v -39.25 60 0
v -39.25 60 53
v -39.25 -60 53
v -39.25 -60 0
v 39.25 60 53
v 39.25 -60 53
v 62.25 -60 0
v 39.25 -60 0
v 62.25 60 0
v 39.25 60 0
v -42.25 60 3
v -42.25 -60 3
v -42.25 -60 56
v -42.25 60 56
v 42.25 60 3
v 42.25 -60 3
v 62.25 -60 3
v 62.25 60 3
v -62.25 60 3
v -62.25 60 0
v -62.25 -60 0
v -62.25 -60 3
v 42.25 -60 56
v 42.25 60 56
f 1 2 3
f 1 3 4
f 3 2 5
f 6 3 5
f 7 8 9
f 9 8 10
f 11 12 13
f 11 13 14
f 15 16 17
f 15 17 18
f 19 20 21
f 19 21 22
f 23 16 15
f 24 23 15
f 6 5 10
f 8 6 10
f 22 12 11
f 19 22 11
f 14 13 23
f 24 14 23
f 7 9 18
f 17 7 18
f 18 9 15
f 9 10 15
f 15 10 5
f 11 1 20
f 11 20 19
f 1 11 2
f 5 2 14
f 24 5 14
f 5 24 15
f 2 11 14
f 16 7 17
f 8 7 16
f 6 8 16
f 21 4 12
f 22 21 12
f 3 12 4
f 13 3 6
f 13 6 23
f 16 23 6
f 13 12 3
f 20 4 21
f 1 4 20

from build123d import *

# Parameters (mm, degrees)
SKETCH_1_W          = 84.5
SKETCH_1_H          = 120
EXTRUDE_1_DEPTH     = 56
SKETCH_2_W          = 78.5
SKETCH_2_H          = 53
CUT_EXTRUDE_1_DEPTH = 140.00022482
SKETCH_3_W          = 3
SKETCH_3_H          = 120
EXTRUDE_2_DEPTH     = 20


with BuildPart() as part:
    # 스케치1 → 보스-돌출1 (new body)
    with BuildSketch(Plane.XY):
        Rectangle(SKETCH_1_W, SKETCH_1_H)
    extrude(amount=EXTRUDE_1_DEPTH)

    # 스케치2 → 컷-돌출1 (cut, through all)
    with BuildSketch(Plane(origin=(0, 60, 0), x_dir=(1, 0, 0), z_dir=(0, 1, 0))):
        with Locations((0, -26.5)):
            Rectangle(SKETCH_2_W, SKETCH_2_H)
    extrude(amount=-CUT_EXTRUDE_1_DEPTH, mode=Mode.SUBTRACT)

    # 스케치3 → 보스-돌출2 (add)
    with BuildSketch(Plane.ZY.offset(42.25)):
        with Locations((1.5, 0)):
            Rectangle(SKETCH_3_W, SKETCH_3_H)
    extrude_2 = extrude(amount=EXTRUDE_2_DEPTH)

    # 대칭 복사1: 보스-돌출2 across plane
    add(extrude_2.mirror(Plane(origin=(0, 0, 0), x_dir=(0, 0, 1), z_dir=(1, 0, 0))))


solid = part.part
